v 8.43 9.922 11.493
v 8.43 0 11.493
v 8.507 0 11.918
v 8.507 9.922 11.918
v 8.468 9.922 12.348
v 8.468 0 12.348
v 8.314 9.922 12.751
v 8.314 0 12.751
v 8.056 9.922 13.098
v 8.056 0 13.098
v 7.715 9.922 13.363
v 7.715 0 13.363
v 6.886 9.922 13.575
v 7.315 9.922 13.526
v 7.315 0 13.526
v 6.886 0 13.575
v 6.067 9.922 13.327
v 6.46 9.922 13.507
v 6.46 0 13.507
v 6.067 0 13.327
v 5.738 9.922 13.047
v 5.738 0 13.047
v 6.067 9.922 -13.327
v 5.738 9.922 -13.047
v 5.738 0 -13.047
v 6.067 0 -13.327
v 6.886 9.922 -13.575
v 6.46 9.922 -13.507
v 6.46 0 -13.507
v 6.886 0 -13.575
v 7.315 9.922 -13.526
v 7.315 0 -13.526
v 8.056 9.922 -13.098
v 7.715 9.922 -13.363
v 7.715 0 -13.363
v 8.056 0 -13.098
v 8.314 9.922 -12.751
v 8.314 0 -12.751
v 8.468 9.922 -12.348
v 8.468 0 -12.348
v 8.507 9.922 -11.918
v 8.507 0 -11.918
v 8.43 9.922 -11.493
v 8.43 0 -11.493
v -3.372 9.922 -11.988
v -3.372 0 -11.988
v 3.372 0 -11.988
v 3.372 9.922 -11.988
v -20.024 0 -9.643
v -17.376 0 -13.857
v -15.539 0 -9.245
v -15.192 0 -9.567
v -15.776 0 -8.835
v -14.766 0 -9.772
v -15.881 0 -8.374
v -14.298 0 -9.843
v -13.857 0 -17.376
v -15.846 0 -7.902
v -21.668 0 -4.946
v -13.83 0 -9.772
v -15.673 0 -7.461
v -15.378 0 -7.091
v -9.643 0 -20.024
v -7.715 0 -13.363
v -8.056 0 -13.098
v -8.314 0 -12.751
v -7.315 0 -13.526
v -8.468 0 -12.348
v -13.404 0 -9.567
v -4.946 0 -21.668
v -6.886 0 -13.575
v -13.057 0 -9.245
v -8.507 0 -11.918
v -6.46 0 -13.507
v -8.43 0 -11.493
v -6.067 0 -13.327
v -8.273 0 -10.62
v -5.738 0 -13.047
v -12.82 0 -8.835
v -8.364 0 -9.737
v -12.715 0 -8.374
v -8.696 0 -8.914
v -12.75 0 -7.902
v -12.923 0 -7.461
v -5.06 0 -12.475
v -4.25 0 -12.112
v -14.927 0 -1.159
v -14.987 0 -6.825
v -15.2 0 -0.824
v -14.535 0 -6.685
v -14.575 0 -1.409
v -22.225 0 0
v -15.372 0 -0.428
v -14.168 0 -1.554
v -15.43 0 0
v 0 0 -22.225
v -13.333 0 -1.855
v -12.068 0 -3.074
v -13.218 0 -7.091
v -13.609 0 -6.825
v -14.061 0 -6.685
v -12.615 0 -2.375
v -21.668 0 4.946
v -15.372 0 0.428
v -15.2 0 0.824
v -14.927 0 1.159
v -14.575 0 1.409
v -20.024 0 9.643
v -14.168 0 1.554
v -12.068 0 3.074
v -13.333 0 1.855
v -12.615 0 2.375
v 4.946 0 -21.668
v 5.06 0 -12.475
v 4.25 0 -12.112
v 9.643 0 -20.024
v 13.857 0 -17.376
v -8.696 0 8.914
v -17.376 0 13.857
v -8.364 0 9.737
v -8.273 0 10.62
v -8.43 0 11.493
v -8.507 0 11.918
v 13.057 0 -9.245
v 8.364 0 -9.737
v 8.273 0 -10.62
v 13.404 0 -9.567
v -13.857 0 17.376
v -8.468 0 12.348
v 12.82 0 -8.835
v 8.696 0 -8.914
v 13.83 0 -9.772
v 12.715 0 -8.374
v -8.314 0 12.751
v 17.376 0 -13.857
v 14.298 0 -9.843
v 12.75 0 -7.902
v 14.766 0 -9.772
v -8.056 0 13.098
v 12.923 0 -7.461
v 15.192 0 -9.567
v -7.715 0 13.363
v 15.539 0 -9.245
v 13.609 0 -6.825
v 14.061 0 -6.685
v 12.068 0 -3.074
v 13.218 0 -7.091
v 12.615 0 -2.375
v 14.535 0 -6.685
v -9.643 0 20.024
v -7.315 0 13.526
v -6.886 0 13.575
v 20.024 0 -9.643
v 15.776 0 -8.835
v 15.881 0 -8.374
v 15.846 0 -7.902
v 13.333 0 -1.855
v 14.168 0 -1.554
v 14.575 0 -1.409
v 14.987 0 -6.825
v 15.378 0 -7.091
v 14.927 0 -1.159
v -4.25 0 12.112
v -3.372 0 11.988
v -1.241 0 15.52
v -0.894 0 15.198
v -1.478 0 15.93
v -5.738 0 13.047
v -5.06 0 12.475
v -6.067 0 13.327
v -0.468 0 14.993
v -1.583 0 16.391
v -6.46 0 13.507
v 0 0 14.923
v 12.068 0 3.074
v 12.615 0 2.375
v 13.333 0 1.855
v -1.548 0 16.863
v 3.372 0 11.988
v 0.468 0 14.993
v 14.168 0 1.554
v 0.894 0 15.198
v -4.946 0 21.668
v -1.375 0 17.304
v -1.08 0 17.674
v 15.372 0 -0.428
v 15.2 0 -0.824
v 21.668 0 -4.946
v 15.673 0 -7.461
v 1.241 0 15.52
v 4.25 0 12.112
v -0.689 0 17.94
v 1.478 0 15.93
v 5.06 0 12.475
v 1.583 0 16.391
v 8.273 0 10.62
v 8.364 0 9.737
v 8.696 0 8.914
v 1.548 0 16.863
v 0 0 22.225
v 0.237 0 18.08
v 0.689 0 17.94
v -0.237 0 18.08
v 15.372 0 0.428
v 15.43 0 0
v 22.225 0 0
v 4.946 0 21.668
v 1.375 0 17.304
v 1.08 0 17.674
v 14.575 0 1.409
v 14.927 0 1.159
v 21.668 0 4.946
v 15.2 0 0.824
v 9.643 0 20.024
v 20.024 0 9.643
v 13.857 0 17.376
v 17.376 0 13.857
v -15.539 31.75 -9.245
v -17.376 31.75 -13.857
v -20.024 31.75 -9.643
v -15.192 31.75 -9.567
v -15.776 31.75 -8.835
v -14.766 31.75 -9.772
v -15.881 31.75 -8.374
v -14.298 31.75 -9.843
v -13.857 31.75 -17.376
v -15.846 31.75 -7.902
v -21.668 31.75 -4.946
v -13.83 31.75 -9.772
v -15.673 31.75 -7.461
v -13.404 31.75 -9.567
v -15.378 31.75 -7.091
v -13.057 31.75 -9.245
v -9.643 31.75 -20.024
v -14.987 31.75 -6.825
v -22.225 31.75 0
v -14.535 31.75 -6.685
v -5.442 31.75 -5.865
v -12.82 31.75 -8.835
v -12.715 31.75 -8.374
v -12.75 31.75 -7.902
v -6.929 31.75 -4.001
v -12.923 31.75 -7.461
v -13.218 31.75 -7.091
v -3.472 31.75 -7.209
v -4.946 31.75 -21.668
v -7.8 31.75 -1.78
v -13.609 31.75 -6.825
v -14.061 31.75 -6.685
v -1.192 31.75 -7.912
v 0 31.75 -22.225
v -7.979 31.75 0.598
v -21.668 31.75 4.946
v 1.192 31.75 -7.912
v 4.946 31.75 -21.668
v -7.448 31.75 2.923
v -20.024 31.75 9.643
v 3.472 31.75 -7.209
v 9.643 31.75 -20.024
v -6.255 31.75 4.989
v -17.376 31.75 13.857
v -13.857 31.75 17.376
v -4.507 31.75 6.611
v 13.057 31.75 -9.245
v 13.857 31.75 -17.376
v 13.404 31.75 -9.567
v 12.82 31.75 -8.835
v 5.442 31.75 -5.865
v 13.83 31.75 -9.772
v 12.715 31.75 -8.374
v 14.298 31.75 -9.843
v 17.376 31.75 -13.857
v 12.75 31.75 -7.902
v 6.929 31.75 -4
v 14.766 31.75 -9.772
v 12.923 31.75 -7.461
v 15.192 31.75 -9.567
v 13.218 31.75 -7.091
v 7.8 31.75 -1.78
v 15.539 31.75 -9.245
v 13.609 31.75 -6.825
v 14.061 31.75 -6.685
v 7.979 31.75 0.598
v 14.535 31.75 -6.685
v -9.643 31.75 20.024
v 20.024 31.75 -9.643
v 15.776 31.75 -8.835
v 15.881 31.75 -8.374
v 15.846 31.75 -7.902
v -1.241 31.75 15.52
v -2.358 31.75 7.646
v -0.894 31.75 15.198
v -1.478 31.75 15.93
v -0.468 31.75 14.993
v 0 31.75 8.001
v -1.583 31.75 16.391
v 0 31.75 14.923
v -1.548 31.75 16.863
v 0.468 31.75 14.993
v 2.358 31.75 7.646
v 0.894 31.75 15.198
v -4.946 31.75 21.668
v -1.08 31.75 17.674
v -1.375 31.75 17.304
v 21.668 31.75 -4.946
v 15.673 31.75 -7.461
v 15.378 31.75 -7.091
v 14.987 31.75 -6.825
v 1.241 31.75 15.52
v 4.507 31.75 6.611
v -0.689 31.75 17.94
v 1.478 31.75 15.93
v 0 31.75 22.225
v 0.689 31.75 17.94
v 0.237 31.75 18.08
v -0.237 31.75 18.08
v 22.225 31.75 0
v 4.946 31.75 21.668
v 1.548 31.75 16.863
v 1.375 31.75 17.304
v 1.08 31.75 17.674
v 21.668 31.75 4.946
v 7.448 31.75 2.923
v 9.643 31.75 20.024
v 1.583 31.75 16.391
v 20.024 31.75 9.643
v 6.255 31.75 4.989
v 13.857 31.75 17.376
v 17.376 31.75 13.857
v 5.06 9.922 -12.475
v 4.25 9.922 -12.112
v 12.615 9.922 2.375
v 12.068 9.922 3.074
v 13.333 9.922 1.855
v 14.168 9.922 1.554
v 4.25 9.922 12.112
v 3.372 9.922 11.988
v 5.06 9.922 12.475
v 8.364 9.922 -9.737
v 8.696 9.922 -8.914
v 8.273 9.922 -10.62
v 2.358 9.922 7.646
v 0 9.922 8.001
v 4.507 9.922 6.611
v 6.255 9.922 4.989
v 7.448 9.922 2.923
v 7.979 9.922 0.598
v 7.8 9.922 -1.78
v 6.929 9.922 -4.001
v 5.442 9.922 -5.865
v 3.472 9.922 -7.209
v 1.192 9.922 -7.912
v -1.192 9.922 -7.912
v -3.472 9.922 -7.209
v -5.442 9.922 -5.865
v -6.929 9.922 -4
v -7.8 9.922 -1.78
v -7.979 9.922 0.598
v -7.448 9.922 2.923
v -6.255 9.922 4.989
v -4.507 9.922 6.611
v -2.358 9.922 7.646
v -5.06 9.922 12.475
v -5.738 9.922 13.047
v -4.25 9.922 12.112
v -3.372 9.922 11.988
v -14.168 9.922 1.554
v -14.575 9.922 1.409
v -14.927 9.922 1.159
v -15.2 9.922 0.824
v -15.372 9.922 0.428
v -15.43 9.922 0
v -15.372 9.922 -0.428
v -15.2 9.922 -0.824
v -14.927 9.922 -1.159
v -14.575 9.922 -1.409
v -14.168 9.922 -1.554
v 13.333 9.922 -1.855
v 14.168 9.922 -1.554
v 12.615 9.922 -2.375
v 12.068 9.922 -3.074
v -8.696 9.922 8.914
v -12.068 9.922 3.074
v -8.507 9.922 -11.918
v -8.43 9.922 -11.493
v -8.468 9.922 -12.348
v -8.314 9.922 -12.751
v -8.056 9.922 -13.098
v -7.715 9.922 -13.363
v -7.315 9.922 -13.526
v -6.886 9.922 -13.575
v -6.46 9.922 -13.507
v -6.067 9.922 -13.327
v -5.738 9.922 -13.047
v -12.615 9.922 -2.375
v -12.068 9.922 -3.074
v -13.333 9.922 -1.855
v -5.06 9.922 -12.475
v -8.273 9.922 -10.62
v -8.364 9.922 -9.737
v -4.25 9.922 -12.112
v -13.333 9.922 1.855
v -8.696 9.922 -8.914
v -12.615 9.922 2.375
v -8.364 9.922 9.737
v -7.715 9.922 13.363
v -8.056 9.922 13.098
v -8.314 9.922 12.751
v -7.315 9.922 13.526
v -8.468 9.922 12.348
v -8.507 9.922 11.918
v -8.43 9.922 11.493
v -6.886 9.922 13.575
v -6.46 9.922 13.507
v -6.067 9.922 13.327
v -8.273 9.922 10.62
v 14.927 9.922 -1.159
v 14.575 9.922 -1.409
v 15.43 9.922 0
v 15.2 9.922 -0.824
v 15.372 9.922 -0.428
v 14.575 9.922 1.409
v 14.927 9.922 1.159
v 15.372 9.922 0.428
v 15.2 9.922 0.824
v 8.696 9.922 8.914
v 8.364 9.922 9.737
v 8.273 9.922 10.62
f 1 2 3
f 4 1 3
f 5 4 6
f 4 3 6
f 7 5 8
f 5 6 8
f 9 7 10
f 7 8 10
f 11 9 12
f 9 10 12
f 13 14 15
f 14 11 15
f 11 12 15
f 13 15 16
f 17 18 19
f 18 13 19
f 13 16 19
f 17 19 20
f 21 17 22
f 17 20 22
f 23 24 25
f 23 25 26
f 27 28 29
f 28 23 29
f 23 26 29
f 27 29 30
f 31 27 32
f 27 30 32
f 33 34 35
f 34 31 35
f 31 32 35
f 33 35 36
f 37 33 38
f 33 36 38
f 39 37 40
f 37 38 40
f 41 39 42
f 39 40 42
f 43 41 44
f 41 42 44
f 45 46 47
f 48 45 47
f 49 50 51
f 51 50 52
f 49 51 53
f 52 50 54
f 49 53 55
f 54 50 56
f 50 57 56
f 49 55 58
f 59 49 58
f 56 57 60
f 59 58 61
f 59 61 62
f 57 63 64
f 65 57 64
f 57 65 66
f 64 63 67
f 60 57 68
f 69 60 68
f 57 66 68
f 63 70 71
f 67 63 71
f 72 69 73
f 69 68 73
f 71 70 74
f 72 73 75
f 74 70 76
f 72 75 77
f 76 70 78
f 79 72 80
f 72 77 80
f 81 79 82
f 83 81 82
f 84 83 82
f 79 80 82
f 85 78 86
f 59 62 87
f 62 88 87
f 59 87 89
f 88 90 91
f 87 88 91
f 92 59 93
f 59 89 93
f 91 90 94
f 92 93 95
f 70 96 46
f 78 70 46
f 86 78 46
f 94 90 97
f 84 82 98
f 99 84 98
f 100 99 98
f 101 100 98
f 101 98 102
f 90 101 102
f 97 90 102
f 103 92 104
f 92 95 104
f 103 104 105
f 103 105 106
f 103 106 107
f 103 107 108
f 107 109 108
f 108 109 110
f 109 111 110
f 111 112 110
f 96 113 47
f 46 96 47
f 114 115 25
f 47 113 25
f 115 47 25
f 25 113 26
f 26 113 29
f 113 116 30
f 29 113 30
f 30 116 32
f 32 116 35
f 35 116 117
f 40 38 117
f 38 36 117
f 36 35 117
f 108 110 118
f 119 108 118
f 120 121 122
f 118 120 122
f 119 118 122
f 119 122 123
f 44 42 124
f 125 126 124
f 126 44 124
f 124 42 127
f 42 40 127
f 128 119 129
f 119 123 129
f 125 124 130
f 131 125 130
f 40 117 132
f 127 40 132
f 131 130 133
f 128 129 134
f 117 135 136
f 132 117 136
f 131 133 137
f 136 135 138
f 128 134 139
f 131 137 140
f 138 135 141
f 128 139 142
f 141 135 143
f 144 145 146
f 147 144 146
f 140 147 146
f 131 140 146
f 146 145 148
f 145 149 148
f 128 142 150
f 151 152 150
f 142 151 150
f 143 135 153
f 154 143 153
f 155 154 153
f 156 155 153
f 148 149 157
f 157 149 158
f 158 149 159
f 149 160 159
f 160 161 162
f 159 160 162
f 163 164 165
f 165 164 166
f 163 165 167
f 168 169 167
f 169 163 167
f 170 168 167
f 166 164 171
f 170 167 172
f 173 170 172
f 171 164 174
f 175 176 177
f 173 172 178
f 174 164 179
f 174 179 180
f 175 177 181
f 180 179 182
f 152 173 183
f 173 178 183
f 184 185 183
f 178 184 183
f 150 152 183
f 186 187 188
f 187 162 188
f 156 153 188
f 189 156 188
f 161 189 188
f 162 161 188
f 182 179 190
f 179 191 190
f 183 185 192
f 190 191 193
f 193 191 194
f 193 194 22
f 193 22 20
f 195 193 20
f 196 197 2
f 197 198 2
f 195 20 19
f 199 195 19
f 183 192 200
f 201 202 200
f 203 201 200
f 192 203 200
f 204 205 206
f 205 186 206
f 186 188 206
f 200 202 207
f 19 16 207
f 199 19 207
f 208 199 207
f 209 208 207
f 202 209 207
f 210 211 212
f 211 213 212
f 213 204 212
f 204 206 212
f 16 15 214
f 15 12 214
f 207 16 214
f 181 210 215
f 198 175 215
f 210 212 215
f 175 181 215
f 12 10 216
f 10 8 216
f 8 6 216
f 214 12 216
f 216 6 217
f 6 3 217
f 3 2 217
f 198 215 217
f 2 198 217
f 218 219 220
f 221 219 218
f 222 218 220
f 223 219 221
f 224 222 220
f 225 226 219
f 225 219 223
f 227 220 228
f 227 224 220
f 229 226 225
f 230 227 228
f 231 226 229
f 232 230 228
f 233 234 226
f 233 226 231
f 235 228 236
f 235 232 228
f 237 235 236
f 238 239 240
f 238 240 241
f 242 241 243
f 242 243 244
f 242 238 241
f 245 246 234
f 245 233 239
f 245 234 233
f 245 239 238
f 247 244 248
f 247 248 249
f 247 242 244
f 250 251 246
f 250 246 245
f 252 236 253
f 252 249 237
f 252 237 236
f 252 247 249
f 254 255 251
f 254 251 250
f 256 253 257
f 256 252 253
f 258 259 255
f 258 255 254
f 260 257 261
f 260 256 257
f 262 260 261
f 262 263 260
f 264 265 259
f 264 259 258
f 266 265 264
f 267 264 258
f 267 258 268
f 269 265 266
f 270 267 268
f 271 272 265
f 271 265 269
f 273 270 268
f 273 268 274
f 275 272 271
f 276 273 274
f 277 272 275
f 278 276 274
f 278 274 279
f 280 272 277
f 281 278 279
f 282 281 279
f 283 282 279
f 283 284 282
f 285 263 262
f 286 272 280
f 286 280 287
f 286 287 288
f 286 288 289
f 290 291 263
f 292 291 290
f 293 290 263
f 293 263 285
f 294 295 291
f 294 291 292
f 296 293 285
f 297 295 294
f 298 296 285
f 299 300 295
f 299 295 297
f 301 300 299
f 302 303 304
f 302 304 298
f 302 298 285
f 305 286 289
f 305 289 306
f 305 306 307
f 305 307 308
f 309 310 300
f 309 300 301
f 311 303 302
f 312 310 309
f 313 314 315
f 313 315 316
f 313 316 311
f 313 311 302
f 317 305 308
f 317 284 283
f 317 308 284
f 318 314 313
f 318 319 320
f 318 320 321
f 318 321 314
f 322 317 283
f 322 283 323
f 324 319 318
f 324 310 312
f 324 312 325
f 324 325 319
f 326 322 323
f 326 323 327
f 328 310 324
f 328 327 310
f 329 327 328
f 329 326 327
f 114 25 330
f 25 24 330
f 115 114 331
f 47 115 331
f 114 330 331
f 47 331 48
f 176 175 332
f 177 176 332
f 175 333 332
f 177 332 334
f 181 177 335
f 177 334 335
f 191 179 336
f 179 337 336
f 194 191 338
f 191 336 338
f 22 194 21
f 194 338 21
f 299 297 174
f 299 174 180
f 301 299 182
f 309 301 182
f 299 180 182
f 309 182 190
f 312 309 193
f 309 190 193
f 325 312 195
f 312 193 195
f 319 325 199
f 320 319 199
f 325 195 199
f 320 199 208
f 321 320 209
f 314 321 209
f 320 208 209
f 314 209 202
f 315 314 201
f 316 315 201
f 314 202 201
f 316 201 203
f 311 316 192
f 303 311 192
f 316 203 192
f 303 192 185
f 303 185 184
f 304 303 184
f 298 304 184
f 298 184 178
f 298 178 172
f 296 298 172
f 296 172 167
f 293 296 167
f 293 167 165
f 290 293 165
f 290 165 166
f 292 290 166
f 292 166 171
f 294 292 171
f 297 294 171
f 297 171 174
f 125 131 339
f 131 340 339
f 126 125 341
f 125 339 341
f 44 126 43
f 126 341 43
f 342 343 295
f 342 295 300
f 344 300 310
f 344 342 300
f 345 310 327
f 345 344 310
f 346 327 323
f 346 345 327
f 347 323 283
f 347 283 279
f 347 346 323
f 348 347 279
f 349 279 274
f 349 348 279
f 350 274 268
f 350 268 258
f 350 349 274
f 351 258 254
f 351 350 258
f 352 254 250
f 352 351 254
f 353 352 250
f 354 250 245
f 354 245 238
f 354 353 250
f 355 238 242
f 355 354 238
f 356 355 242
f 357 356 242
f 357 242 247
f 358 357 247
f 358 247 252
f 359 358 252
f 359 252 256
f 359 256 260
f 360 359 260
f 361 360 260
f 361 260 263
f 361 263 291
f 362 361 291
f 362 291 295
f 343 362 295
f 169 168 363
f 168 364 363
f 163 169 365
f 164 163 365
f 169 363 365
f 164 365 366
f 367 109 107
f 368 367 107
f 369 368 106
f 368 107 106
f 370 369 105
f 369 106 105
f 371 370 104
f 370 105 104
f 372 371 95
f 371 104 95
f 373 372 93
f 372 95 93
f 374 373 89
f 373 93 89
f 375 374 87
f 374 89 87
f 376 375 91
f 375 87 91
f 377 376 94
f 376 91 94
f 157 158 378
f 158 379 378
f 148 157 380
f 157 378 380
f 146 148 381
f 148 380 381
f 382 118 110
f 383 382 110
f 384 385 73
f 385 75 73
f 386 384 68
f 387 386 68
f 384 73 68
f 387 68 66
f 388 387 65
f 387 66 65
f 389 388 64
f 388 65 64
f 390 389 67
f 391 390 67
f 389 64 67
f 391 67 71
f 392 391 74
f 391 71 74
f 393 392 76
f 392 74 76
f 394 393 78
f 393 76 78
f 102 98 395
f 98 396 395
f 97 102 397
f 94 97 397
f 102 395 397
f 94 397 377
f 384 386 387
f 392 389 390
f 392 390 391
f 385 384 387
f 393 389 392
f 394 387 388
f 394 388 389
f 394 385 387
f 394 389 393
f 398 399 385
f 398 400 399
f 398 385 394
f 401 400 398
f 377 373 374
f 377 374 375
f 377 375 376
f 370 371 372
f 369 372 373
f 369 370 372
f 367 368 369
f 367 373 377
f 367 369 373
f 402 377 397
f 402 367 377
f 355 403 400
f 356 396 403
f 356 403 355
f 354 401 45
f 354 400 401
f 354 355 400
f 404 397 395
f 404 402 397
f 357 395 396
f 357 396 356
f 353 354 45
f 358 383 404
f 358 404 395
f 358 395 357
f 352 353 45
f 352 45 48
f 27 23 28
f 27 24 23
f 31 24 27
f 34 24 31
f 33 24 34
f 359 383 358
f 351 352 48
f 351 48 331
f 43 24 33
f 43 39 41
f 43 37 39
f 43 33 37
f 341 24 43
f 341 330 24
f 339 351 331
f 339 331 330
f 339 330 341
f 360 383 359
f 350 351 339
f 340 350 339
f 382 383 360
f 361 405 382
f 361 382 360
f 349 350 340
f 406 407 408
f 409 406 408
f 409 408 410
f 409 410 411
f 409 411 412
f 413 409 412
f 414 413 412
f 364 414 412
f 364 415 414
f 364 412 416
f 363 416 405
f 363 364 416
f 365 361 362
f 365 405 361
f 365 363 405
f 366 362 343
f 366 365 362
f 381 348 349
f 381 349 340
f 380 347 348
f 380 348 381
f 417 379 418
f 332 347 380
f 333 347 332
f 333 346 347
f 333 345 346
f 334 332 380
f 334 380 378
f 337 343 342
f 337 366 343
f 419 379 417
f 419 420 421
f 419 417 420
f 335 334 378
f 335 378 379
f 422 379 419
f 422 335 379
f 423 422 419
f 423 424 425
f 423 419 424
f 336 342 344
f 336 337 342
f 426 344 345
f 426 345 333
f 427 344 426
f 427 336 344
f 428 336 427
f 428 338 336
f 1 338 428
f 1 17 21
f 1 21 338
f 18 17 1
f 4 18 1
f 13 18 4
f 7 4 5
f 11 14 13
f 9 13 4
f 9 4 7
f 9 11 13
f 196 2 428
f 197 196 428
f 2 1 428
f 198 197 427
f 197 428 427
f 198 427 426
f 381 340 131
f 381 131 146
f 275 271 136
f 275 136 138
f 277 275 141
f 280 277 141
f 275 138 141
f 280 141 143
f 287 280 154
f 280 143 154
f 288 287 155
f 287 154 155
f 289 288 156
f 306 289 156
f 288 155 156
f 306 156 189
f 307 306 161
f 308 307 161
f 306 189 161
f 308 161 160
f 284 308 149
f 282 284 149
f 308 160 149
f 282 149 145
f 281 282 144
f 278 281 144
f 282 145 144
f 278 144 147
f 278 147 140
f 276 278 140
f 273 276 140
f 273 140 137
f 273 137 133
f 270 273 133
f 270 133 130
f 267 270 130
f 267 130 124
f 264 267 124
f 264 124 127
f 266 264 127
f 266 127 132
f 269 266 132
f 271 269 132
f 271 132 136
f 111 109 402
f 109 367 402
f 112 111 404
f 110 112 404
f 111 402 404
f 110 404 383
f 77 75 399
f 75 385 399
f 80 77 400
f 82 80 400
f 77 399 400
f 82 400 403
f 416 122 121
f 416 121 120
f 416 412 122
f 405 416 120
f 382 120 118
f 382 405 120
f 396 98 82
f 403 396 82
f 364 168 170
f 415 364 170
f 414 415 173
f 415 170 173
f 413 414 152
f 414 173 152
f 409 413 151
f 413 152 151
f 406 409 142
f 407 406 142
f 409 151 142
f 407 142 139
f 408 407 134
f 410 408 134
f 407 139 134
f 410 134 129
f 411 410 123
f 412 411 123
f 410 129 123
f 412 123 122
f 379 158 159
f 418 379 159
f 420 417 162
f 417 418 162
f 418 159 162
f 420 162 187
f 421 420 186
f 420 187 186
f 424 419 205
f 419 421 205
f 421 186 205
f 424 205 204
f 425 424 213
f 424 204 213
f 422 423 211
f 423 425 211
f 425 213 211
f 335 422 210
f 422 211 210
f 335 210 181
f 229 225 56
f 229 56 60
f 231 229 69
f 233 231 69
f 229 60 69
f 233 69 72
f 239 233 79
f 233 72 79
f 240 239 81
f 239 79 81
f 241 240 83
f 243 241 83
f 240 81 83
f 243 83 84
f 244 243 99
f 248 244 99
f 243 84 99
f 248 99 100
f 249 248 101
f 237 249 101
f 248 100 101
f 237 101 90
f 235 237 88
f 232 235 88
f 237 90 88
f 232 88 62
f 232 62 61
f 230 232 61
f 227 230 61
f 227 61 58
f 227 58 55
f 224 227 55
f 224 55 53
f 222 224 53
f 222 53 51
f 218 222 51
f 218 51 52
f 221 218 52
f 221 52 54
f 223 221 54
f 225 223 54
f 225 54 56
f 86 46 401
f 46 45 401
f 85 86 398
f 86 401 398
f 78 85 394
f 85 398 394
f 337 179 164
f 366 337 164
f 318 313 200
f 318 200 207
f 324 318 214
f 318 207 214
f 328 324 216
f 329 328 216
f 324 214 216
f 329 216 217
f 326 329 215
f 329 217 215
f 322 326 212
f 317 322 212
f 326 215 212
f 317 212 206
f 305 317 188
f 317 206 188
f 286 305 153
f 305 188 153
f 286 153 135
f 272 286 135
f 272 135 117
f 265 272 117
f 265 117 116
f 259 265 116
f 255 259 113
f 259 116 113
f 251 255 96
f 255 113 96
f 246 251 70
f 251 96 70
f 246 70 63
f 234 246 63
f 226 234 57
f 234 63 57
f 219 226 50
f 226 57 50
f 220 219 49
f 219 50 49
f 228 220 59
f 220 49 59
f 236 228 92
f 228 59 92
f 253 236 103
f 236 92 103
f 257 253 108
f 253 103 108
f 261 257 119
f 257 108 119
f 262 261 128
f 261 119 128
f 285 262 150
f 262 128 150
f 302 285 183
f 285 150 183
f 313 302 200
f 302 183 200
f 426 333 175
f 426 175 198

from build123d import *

# Parameters (mm, degrees)
SKETCH1_R           = 22.225
SKETCH1_R_2         = 8.001
BOSS_EXTRUDE1_DEPTH = 31.75
SKETCH2_R           = 1.5875
SKETCH2_R_2         = 8.001
CUT_EXTRUDE1_DEPTH  = 9.921875
FILLET1_R           = 3.175
SKETCH3_R           = 1.5875
CUT_EXTRUDE2_DEPTH  = 45.676210112


with BuildPart() as part:
    # Sketch1 → Boss-Extrude1 (new body)
    with BuildSketch(Plane(origin=(0, 0, 0), x_dir=(1, 0, 0), z_dir=(0, 1, 0))):
        with Locations(Location((0, 0, 0), (0, 0, 270))):
            Circle(SKETCH1_R)
        with Locations(Location((0, 0, 0), (0, 0, 270))):
            Circle(SKETCH1_R_2, mode=Mode.SUBTRACT)
    extrude(amount=BOSS_EXTRUDE1_DEPTH)

    # Sketch2 → Cut-Extrude1 (cut)
    # profile 1 of 31: a face of its own
    with BuildSketch(Plane.XZ):
        with BuildLine():
            ThreePointArc((-12.2555, 0), (-12.468184671, 0.79375), (-13.04925, 1.374815329))
            Line((-13.04925, 1.374815329), (-13.843, 0))
            Line((-13.843, 0), (-13.04925, -1.374815329))
            ThreePointArc((-13.04925, -1.374815329), (-12.468184671, -0.79375), (-12.2555, 0))
        make_face()
    # profile 2 of 31: a face of its own
    with BuildSketch(Plane.XZ):
        with BuildLine():
            Line((-13.843, 0), (-13.04925, 1.374815329))
            ThreePointArc((-13.04925, 1.374815329), (-15.4305, 0), (-13.04925, -1.374815329))
            Line((-13.04925, -1.374815329), (-13.843, 0))
        make_face()
    # profile 3 of 31: a face of its own
    with BuildSketch(Plane.XZ):
        with BuildLine():
            ThreePointArc((-12.2555, 0), (-12.468184671, 0.79375), (-13.04925, 1.374815329))
            Line((-13.04925, 1.374815329), (-13.843, 0))
            Line((-13.843, 0), (-13.04925, -1.374815329))
            ThreePointArc((-13.04925, -1.374815329), (-12.468184671, -0.79375), (-12.2555, 0))
        make_face()
    # profile 4 of 31: a face of its own
    with BuildSketch(Plane.XZ):
        with BuildLine():
            Line((-13.843, 0), (-13.04925, 1.374815329))
            ThreePointArc((-13.04925, 1.374815329), (-15.4305, 0), (-13.04925, -1.374815329))
            Line((-13.04925, -1.374815329), (-13.843, 0))
        make_face()
    # profile 5 of 31: a face of its own
    with BuildSketch(Plane.XZ):
        with Locations((-13.843, 0)):
            Circle(SKETCH2_R)
    # profile 6 of 31: a face of its own
    with BuildSketch(Plane.XZ):
        with Locations((-6.9215, -11.988389665)):
            Circle(SKETCH2_R)
    # profile 7 of 31: a face of its own
    with BuildSketch(Plane.XZ):
        with Locations((6.9215, -11.988389665)):
            Circle(SKETCH2_R)
    # profile 8 of 31: a face of its own
    with BuildSketch(Plane.XZ):
        with Locations((13.843, 0)):
            Circle(SKETCH2_R)
    # profile 9 of 31: a face of its own
    with BuildSketch(Plane.XZ):
        with Locations((6.9215, 11.988389665)):
            Circle(SKETCH2_R)
    # profile 10 of 31: a face of its own
    with BuildSketch(Plane.XZ):
        with Locations((-6.9215, 11.988389665)):
            Circle(SKETCH2_R)
    # profile 11 of 31: a face of its own
    with BuildSketch(Plane.XZ):
        Polygon((-13.843, 0), (-6.9215, -11.988389665), (6.9215, -11.988389665), (13.843, 0), (6.9215, 11.988389665), (-6.9215, 11.988389665), align=None)
        with Locations(Location((0, 0, 0), (0, 0, 270))):
            Circle(SKETCH2_R_2, mode=Mode.SUBTRACT)
    # profile 12 of 31: a face of its own
    with BuildSketch(Plane.XZ):
        with BuildLine():
            ThreePointArc((-5.334, -11.988389665), (-6.12775, -10.613574336), (-7.71525, -10.613574336))
            Line((-7.71525, -10.613574336), (-6.9215, -11.988389665))
            Line((-6.9215, -11.988389665), (-5.334, -11.988389665))
        make_face()
    # profile 13 of 31: a face of its own
    with BuildSketch(Plane.XZ):
        with BuildLine():
            Line((-6.9215, -11.988389665), (-7.71525, -10.613574336))
            ThreePointArc((-7.71525, -10.613574336), (-7.71525, -13.363204993), (-5.334, -11.988389665))
            Line((-5.334, -11.988389665), (-6.9215, -11.988389665))
        make_face()
    # profile 14 of 31: a face of its own
    with BuildSketch(Plane.XZ):
        with BuildLine():
            ThreePointArc((-5.334, -11.988389665), (-6.12775, -10.613574336), (-7.71525, -10.613574336))
            Line((-7.71525, -10.613574336), (-6.9215, -11.988389665))
            Line((-6.9215, -11.988389665), (-5.334, -11.988389665))
        make_face()
    # profile 15 of 31: a face of its own
    with BuildSketch(Plane.XZ):
        with BuildLine():
            Line((-6.9215, -11.988389665), (-7.71525, -10.613574336))
            ThreePointArc((-7.71525, -10.613574336), (-7.71525, -13.363204993), (-5.334, -11.988389665))
            Line((-5.334, -11.988389665), (-6.9215, -11.988389665))
        make_face()
    # profile 16 of 31: a face of its own
    with BuildSketch(Plane.XZ):
        with BuildLine():
            ThreePointArc((8.509, -11.988389665), (8.296315329, -11.194639665), (7.71525, -10.613574336))
            Line((7.71525, -10.613574336), (6.9215, -11.988389665))
            Line((6.9215, -11.988389665), (5.334, -11.988389665))
            ThreePointArc((5.334, -11.988389665), (6.9215, -13.575889665), (8.509, -11.988389665))
        make_face()
    # profile 17 of 31: a face of its own
    with BuildSketch(Plane.XZ):
        with BuildLine():
            Line((6.9215, -11.988389665), (7.71525, -10.613574336))
            ThreePointArc((7.71525, -10.613574336), (6.12775, -10.613574336), (5.334, -11.988389665))
            Line((5.334, -11.988389665), (6.9215, -11.988389665))
        make_face()
    # profile 18 of 31: a face of its own
    with BuildSketch(Plane.XZ):
        with BuildLine():
            ThreePointArc((8.509, -11.988389665), (8.296315329, -11.194639665), (7.71525, -10.613574336))
            Line((7.71525, -10.613574336), (6.9215, -11.988389665))
            Line((6.9215, -11.988389665), (5.334, -11.988389665))
            ThreePointArc((5.334, -11.988389665), (6.9215, -13.575889665), (8.509, -11.988389665))
        make_face()
    # profile 19 of 31: a face of its own
    with BuildSketch(Plane.XZ):
        with BuildLine():
            Line((6.9215, -11.988389665), (7.71525, -10.613574336))
            ThreePointArc((7.71525, -10.613574336), (6.12775, -10.613574336), (5.334, -11.988389665))
            Line((5.334, -11.988389665), (6.9215, -11.988389665))
        make_face()
    # profile 20 of 31: a face of its own
    with BuildSketch(Plane.XZ):
        with BuildLine():
            ThreePointArc((15.4305, 0), (14.63675, 1.374815329), (13.04925, 1.374815329))
            Line((13.04925, 1.374815329), (13.843, 0))
            Line((13.843, 0), (13.04925, -1.374815329))
            ThreePointArc((13.04925, -1.374815329), (14.63675, -1.374815329), (15.4305, 0))
        make_face()
    # profile 21 of 31: a face of its own
    with BuildSketch(Plane.XZ):
        with BuildLine():
            Line((13.843, 0), (13.04925, 1.374815329))
            ThreePointArc((13.04925, 1.374815329), (12.2555, 0), (13.04925, -1.374815329))
            Line((13.04925, -1.374815329), (13.843, 0))
        make_face()
    # profile 22 of 31: a face of its own
    with BuildSketch(Plane.XZ):
        with BuildLine():
            ThreePointArc((15.4305, 0), (14.63675, 1.374815329), (13.04925, 1.374815329))
            Line((13.04925, 1.374815329), (13.843, 0))
            Line((13.843, 0), (13.04925, -1.374815329))
            ThreePointArc((13.04925, -1.374815329), (14.63675, -1.374815329), (15.4305, 0))
        make_face()
    # profile 23 of 31: a face of its own
    with BuildSketch(Plane.XZ):
        with BuildLine():
            Line((13.843, 0), (13.04925, 1.374815329))
            ThreePointArc((13.04925, 1.374815329), (12.2555, 0), (13.04925, -1.374815329))
            Line((13.04925, -1.374815329), (13.843, 0))
        make_face()
    # profile 24 of 31: a face of its own
    with BuildSketch(Plane.XZ):
        with BuildLine():
            ThreePointArc((8.509, 11.988389665), (6.9215, 13.575889665), (5.334, 11.988389665))
            Line((5.334, 11.988389665), (6.9215, 11.988389665))
            Line((6.9215, 11.988389665), (7.71525, 10.613574336))
            ThreePointArc((7.71525, 10.613574336), (8.296315329, 11.194639665), (8.509, 11.988389665))
        make_face()
    # profile 25 of 31: a face of its own
    with BuildSketch(Plane.XZ):
        with BuildLine():
            Line((6.9215, 11.988389665), (5.334, 11.988389665))
            ThreePointArc((5.334, 11.988389665), (6.12775, 10.613574336), (7.71525, 10.613574336))
            Line((7.71525, 10.613574336), (6.9215, 11.988389665))
        make_face()
    # profile 26 of 31: a face of its own
    with BuildSketch(Plane.XZ):
        with BuildLine():
            ThreePointArc((8.509, 11.988389665), (6.9215, 13.575889665), (5.334, 11.988389665))
            Line((5.334, 11.988389665), (6.9215, 11.988389665))
            Line((6.9215, 11.988389665), (7.71525, 10.613574336))
            ThreePointArc((7.71525, 10.613574336), (8.296315329, 11.194639665), (8.509, 11.988389665))
        make_face()
    # profile 27 of 31: a face of its own
    with BuildSketch(Plane.XZ):
        with BuildLine():
            Line((6.9215, 11.988389665), (5.334, 11.988389665))
            ThreePointArc((5.334, 11.988389665), (6.12775, 10.613574336), (7.71525, 10.613574336))
            Line((7.71525, 10.613574336), (6.9215, 11.988389665))
        make_face()
    # profile 28 of 31: a face of its own
    with BuildSketch(Plane.XZ):
        with BuildLine():
            ThreePointArc((-7.71525, 10.613574336), (-6.12775, 10.613574336), (-5.334, 11.988389665))
            Line((-5.334, 11.988389665), (-6.9215, 11.988389665))
            Line((-6.9215, 11.988389665), (-7.71525, 10.613574336))
        make_face()
    # profile 29 of 31: a face of its own
    with BuildSketch(Plane.XZ):
        with BuildLine():
            Line((-6.9215, 11.988389665), (-5.334, 11.988389665))
            ThreePointArc((-5.334, 11.988389665), (-7.71525, 13.363204993), (-7.71525, 10.613574336))
            Line((-7.71525, 10.613574336), (-6.9215, 11.988389665))
        make_face()
    # profile 30 of 31: a face of its own
    with BuildSketch(Plane.XZ):
        with BuildLine():
            ThreePointArc((-7.71525, 10.613574336), (-6.12775, 10.613574336), (-5.334, 11.988389665))
            Line((-5.334, 11.988389665), (-6.9215, 11.988389665))
            Line((-6.9215, 11.988389665), (-7.71525, 10.613574336))
        make_face()
    # profile 31 of 31: a face of its own
    with BuildSketch(Plane.XZ):
        with BuildLine():
            Line((-6.9215, 11.988389665), (-5.334, 11.988389665))
            ThreePointArc((-5.334, 11.988389665), (-7.71525, 13.363204993), (-7.71525, 10.613574336))
            Line((-7.71525, 10.613574336), (-6.9215, 11.988389665))
        make_face()
    extrude(amount=-CUT_EXTRUDE1_DEPTH, mode=Mode.SUBTRACT)

    # Fillet1
    fillet1_edges = [part.edges().sort_by_distance(p)[0] for p in [
        (-5.334, 4.9609375, -11.988389665),
        (-7.71525, 4.9609375, -10.613574336),
        (-13.04925, 4.9609375, -1.374815329),
        (-13.04925, 4.9609375, 1.374815329),
        (-7.71525, 4.9609375, 10.613574336),
        (-5.334, 4.9609375, 11.988389665),
        (5.334, 4.9609375, 11.988389665),
        (7.71525, 4.9609375, 10.613574336),
        (13.04925, 4.9609375, 1.374815329),
        (13.04925, 4.9609375, -1.374815329),
        (7.71525, 4.9609375, -10.613574336),
        (5.334, 4.9609375, -11.988389665),
    ]]
    fillet(fillet1_edges, radius=FILLET1_R)

    # Sketch3 → Cut-Extrude2 (cut, through all)
    with BuildSketch(Plane.XZ):
        with Locations(Location((0, 16.51, 0), (0, 0, 270))):
            Circle(SKETCH3_R)
        with Locations(Location((14.298079416, -8.255, 0), (0, 0, 270))):
            Circle(SKETCH3_R)
        with Locations(Location((-14.298079416, -8.255, 0), (0, 0, 270))):
            Circle(SKETCH3_R)
    extrude(amount=-CUT_EXTRUDE2_DEPTH, mode=Mode.SUBTRACT)


solid = part.part
